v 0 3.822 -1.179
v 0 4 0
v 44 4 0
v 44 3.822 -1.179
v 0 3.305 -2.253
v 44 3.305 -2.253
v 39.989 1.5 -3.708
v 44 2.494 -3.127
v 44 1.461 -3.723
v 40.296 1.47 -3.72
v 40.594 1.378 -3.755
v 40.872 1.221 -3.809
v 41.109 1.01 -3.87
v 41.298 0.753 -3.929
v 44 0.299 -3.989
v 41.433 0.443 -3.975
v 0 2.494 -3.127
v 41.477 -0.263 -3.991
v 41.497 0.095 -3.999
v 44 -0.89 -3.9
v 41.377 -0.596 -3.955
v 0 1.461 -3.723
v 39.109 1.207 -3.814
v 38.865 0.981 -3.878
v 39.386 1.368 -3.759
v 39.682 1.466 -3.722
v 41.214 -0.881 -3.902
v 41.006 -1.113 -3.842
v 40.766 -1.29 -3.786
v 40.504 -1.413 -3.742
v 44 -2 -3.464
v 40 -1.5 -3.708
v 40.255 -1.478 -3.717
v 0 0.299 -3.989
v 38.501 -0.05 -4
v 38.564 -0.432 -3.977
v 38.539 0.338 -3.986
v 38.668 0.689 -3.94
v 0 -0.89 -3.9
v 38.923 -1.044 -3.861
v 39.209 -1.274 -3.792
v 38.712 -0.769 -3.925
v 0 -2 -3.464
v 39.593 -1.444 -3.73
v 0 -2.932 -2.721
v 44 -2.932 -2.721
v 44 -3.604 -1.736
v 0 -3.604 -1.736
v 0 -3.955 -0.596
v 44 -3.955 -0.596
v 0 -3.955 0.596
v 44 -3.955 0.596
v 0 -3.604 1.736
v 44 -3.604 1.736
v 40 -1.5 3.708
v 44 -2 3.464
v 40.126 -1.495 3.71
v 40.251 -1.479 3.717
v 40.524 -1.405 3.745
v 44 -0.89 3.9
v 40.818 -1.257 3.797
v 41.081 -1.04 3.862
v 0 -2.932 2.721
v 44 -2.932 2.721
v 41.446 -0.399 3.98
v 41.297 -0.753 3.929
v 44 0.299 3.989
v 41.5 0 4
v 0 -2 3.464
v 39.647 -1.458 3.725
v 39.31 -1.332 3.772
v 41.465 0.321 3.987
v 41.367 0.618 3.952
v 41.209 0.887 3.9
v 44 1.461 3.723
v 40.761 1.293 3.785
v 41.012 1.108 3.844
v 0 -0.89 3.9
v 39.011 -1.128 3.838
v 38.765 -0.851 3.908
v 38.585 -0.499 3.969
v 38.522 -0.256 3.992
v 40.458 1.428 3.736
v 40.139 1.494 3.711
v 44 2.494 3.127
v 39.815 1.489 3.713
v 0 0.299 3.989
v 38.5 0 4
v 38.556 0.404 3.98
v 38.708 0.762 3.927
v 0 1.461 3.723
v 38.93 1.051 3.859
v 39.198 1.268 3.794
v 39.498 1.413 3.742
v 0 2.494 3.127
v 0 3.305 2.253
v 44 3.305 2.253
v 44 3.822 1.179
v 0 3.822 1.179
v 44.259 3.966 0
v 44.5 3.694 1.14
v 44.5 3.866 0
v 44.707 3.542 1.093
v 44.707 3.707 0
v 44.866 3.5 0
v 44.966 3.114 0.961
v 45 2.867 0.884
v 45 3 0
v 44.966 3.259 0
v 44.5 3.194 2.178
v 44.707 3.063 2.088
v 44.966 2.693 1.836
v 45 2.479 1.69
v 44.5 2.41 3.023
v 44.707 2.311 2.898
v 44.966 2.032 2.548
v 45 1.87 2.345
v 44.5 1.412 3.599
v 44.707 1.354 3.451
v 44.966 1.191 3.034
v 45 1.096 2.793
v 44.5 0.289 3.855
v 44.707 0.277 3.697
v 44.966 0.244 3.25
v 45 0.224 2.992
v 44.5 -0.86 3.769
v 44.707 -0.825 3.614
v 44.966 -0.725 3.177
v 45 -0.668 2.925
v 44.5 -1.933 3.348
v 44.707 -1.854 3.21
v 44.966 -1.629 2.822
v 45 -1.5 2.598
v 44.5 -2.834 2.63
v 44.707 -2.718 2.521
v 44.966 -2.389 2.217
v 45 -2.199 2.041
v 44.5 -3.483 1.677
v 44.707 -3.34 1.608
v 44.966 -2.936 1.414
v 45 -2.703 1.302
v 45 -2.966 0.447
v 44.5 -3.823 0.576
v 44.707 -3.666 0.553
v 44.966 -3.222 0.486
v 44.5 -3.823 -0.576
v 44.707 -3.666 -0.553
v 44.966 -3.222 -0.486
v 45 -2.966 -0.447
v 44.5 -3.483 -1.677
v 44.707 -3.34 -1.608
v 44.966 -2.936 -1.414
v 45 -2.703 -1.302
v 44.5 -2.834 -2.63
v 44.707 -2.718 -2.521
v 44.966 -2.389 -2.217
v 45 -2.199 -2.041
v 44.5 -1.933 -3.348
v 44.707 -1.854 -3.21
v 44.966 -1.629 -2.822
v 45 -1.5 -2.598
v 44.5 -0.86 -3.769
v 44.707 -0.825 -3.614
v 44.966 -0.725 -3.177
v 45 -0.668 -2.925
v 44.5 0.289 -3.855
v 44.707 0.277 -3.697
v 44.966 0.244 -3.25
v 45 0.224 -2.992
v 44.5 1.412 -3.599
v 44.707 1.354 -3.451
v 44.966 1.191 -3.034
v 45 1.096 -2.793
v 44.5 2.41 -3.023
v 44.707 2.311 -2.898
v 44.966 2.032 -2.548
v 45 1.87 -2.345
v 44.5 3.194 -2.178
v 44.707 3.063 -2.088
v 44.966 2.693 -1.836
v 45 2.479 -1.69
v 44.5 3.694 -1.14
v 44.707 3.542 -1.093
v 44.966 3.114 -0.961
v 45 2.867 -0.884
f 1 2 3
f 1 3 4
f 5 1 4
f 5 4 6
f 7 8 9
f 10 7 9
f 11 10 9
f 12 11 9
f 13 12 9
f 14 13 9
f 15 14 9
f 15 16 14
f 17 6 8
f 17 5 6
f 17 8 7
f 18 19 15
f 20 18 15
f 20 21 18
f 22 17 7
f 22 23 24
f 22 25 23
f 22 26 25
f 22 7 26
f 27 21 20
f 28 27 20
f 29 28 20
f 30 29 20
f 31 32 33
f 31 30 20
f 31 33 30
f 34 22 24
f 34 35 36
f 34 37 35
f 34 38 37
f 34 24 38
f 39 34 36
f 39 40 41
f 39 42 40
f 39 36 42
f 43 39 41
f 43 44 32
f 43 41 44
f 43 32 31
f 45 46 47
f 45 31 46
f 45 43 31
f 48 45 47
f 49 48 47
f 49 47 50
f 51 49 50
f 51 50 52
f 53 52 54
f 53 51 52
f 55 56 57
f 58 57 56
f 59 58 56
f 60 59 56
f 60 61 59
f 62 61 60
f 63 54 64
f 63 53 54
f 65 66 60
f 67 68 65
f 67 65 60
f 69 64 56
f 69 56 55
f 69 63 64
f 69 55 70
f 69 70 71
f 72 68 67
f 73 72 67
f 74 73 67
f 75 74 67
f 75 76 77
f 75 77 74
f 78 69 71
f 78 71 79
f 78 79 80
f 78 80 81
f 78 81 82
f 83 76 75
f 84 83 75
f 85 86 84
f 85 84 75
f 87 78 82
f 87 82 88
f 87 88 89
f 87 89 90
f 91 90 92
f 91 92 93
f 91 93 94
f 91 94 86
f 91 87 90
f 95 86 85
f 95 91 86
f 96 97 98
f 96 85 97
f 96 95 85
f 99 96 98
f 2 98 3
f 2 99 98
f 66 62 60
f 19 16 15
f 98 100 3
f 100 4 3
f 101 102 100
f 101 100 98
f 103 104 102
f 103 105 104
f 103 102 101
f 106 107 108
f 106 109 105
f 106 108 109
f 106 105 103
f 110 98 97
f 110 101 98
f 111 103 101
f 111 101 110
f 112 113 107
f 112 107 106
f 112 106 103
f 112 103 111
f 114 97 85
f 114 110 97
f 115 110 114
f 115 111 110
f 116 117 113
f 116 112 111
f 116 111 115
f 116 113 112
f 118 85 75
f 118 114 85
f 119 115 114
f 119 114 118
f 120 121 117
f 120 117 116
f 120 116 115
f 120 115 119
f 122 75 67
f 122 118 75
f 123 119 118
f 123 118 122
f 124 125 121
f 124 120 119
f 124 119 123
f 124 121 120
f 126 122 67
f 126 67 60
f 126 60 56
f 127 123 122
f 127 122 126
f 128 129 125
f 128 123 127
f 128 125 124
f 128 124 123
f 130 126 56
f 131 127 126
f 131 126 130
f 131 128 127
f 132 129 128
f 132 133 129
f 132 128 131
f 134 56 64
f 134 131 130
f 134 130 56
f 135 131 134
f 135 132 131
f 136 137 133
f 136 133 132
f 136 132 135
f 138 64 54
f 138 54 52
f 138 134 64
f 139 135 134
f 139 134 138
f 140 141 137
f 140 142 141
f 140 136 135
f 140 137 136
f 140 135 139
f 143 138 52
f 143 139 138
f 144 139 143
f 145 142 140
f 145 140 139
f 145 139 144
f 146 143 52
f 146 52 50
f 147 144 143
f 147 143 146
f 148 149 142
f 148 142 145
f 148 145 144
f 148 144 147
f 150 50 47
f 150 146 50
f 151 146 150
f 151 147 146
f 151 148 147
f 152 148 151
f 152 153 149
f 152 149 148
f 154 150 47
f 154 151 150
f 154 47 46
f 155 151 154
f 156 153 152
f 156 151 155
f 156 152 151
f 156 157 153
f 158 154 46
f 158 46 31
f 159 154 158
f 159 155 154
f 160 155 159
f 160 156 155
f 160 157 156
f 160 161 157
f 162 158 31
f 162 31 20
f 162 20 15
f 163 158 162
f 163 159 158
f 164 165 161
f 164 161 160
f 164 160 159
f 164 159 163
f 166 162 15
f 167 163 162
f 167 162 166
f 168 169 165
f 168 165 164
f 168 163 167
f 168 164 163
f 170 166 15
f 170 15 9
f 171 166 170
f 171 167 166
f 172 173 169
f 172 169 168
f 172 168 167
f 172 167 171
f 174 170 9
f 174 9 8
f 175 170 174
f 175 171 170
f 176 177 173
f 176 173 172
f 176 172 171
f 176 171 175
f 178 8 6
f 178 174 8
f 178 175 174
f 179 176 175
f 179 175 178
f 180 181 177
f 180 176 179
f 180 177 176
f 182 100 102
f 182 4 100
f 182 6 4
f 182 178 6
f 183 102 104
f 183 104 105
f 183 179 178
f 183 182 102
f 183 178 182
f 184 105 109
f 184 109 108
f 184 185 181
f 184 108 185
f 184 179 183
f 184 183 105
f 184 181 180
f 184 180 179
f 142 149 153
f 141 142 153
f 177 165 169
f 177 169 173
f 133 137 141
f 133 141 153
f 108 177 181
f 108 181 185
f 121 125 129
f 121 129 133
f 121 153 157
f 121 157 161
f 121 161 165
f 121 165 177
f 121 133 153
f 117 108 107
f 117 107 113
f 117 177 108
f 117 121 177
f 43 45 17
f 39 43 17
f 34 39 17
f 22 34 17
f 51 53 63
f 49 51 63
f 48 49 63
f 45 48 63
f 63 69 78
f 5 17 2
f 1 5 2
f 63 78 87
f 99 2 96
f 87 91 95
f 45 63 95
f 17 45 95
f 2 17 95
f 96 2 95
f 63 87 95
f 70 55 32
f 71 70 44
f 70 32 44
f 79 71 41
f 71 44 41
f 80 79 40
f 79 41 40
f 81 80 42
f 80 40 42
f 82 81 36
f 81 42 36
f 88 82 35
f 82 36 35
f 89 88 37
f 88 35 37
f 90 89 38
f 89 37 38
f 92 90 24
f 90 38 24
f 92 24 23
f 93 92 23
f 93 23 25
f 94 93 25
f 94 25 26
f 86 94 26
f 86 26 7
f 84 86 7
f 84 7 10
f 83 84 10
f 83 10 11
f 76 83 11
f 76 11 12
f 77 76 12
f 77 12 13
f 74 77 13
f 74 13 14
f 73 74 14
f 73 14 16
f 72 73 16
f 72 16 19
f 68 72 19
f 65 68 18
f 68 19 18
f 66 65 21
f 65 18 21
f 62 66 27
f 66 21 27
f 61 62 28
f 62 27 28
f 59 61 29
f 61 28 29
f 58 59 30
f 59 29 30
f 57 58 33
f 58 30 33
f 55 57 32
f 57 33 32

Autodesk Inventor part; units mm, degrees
ref_plane "YZ Plane" through (0, 0, 0) normal (1, 0, 0) x (0, 1, 0)
ref_plane "XZ Plane" through (0, 0, 0) normal (0, 1, 0) x (-1, 0, 0)
sketch "Esboço1" plane through (0, 0, 0) normal (1, 0, 0) x (0, 1, 0)
  circle A0 centre (0, 0) radius 4
  dimension "d0" = 8
extrude "Extrusão1" add sketch "Esboço1" along normal blind 45
fillet "Arredondamento1" radius 1 1 edges at (45, -4, 0)
ref_plane "Plano de trabalho1" through (0, 0, 4) normal (0, 0, 1) x (1, 0, 0)
sketch "Esboço2" plane through (0, 0, 4) normal (0, 0, 1) x (1, 0, 0)
  line L0 (45, 3) -> (45, -3) projected
  line L1 (45, 0) -> (40, 0)
  point P0 (0, 0)
  dimension "d5" = 5
hole "Furo1" at (40, 0, 4) direction (0, 0, -1) diameter 3 end through all
properties part number "piston"
